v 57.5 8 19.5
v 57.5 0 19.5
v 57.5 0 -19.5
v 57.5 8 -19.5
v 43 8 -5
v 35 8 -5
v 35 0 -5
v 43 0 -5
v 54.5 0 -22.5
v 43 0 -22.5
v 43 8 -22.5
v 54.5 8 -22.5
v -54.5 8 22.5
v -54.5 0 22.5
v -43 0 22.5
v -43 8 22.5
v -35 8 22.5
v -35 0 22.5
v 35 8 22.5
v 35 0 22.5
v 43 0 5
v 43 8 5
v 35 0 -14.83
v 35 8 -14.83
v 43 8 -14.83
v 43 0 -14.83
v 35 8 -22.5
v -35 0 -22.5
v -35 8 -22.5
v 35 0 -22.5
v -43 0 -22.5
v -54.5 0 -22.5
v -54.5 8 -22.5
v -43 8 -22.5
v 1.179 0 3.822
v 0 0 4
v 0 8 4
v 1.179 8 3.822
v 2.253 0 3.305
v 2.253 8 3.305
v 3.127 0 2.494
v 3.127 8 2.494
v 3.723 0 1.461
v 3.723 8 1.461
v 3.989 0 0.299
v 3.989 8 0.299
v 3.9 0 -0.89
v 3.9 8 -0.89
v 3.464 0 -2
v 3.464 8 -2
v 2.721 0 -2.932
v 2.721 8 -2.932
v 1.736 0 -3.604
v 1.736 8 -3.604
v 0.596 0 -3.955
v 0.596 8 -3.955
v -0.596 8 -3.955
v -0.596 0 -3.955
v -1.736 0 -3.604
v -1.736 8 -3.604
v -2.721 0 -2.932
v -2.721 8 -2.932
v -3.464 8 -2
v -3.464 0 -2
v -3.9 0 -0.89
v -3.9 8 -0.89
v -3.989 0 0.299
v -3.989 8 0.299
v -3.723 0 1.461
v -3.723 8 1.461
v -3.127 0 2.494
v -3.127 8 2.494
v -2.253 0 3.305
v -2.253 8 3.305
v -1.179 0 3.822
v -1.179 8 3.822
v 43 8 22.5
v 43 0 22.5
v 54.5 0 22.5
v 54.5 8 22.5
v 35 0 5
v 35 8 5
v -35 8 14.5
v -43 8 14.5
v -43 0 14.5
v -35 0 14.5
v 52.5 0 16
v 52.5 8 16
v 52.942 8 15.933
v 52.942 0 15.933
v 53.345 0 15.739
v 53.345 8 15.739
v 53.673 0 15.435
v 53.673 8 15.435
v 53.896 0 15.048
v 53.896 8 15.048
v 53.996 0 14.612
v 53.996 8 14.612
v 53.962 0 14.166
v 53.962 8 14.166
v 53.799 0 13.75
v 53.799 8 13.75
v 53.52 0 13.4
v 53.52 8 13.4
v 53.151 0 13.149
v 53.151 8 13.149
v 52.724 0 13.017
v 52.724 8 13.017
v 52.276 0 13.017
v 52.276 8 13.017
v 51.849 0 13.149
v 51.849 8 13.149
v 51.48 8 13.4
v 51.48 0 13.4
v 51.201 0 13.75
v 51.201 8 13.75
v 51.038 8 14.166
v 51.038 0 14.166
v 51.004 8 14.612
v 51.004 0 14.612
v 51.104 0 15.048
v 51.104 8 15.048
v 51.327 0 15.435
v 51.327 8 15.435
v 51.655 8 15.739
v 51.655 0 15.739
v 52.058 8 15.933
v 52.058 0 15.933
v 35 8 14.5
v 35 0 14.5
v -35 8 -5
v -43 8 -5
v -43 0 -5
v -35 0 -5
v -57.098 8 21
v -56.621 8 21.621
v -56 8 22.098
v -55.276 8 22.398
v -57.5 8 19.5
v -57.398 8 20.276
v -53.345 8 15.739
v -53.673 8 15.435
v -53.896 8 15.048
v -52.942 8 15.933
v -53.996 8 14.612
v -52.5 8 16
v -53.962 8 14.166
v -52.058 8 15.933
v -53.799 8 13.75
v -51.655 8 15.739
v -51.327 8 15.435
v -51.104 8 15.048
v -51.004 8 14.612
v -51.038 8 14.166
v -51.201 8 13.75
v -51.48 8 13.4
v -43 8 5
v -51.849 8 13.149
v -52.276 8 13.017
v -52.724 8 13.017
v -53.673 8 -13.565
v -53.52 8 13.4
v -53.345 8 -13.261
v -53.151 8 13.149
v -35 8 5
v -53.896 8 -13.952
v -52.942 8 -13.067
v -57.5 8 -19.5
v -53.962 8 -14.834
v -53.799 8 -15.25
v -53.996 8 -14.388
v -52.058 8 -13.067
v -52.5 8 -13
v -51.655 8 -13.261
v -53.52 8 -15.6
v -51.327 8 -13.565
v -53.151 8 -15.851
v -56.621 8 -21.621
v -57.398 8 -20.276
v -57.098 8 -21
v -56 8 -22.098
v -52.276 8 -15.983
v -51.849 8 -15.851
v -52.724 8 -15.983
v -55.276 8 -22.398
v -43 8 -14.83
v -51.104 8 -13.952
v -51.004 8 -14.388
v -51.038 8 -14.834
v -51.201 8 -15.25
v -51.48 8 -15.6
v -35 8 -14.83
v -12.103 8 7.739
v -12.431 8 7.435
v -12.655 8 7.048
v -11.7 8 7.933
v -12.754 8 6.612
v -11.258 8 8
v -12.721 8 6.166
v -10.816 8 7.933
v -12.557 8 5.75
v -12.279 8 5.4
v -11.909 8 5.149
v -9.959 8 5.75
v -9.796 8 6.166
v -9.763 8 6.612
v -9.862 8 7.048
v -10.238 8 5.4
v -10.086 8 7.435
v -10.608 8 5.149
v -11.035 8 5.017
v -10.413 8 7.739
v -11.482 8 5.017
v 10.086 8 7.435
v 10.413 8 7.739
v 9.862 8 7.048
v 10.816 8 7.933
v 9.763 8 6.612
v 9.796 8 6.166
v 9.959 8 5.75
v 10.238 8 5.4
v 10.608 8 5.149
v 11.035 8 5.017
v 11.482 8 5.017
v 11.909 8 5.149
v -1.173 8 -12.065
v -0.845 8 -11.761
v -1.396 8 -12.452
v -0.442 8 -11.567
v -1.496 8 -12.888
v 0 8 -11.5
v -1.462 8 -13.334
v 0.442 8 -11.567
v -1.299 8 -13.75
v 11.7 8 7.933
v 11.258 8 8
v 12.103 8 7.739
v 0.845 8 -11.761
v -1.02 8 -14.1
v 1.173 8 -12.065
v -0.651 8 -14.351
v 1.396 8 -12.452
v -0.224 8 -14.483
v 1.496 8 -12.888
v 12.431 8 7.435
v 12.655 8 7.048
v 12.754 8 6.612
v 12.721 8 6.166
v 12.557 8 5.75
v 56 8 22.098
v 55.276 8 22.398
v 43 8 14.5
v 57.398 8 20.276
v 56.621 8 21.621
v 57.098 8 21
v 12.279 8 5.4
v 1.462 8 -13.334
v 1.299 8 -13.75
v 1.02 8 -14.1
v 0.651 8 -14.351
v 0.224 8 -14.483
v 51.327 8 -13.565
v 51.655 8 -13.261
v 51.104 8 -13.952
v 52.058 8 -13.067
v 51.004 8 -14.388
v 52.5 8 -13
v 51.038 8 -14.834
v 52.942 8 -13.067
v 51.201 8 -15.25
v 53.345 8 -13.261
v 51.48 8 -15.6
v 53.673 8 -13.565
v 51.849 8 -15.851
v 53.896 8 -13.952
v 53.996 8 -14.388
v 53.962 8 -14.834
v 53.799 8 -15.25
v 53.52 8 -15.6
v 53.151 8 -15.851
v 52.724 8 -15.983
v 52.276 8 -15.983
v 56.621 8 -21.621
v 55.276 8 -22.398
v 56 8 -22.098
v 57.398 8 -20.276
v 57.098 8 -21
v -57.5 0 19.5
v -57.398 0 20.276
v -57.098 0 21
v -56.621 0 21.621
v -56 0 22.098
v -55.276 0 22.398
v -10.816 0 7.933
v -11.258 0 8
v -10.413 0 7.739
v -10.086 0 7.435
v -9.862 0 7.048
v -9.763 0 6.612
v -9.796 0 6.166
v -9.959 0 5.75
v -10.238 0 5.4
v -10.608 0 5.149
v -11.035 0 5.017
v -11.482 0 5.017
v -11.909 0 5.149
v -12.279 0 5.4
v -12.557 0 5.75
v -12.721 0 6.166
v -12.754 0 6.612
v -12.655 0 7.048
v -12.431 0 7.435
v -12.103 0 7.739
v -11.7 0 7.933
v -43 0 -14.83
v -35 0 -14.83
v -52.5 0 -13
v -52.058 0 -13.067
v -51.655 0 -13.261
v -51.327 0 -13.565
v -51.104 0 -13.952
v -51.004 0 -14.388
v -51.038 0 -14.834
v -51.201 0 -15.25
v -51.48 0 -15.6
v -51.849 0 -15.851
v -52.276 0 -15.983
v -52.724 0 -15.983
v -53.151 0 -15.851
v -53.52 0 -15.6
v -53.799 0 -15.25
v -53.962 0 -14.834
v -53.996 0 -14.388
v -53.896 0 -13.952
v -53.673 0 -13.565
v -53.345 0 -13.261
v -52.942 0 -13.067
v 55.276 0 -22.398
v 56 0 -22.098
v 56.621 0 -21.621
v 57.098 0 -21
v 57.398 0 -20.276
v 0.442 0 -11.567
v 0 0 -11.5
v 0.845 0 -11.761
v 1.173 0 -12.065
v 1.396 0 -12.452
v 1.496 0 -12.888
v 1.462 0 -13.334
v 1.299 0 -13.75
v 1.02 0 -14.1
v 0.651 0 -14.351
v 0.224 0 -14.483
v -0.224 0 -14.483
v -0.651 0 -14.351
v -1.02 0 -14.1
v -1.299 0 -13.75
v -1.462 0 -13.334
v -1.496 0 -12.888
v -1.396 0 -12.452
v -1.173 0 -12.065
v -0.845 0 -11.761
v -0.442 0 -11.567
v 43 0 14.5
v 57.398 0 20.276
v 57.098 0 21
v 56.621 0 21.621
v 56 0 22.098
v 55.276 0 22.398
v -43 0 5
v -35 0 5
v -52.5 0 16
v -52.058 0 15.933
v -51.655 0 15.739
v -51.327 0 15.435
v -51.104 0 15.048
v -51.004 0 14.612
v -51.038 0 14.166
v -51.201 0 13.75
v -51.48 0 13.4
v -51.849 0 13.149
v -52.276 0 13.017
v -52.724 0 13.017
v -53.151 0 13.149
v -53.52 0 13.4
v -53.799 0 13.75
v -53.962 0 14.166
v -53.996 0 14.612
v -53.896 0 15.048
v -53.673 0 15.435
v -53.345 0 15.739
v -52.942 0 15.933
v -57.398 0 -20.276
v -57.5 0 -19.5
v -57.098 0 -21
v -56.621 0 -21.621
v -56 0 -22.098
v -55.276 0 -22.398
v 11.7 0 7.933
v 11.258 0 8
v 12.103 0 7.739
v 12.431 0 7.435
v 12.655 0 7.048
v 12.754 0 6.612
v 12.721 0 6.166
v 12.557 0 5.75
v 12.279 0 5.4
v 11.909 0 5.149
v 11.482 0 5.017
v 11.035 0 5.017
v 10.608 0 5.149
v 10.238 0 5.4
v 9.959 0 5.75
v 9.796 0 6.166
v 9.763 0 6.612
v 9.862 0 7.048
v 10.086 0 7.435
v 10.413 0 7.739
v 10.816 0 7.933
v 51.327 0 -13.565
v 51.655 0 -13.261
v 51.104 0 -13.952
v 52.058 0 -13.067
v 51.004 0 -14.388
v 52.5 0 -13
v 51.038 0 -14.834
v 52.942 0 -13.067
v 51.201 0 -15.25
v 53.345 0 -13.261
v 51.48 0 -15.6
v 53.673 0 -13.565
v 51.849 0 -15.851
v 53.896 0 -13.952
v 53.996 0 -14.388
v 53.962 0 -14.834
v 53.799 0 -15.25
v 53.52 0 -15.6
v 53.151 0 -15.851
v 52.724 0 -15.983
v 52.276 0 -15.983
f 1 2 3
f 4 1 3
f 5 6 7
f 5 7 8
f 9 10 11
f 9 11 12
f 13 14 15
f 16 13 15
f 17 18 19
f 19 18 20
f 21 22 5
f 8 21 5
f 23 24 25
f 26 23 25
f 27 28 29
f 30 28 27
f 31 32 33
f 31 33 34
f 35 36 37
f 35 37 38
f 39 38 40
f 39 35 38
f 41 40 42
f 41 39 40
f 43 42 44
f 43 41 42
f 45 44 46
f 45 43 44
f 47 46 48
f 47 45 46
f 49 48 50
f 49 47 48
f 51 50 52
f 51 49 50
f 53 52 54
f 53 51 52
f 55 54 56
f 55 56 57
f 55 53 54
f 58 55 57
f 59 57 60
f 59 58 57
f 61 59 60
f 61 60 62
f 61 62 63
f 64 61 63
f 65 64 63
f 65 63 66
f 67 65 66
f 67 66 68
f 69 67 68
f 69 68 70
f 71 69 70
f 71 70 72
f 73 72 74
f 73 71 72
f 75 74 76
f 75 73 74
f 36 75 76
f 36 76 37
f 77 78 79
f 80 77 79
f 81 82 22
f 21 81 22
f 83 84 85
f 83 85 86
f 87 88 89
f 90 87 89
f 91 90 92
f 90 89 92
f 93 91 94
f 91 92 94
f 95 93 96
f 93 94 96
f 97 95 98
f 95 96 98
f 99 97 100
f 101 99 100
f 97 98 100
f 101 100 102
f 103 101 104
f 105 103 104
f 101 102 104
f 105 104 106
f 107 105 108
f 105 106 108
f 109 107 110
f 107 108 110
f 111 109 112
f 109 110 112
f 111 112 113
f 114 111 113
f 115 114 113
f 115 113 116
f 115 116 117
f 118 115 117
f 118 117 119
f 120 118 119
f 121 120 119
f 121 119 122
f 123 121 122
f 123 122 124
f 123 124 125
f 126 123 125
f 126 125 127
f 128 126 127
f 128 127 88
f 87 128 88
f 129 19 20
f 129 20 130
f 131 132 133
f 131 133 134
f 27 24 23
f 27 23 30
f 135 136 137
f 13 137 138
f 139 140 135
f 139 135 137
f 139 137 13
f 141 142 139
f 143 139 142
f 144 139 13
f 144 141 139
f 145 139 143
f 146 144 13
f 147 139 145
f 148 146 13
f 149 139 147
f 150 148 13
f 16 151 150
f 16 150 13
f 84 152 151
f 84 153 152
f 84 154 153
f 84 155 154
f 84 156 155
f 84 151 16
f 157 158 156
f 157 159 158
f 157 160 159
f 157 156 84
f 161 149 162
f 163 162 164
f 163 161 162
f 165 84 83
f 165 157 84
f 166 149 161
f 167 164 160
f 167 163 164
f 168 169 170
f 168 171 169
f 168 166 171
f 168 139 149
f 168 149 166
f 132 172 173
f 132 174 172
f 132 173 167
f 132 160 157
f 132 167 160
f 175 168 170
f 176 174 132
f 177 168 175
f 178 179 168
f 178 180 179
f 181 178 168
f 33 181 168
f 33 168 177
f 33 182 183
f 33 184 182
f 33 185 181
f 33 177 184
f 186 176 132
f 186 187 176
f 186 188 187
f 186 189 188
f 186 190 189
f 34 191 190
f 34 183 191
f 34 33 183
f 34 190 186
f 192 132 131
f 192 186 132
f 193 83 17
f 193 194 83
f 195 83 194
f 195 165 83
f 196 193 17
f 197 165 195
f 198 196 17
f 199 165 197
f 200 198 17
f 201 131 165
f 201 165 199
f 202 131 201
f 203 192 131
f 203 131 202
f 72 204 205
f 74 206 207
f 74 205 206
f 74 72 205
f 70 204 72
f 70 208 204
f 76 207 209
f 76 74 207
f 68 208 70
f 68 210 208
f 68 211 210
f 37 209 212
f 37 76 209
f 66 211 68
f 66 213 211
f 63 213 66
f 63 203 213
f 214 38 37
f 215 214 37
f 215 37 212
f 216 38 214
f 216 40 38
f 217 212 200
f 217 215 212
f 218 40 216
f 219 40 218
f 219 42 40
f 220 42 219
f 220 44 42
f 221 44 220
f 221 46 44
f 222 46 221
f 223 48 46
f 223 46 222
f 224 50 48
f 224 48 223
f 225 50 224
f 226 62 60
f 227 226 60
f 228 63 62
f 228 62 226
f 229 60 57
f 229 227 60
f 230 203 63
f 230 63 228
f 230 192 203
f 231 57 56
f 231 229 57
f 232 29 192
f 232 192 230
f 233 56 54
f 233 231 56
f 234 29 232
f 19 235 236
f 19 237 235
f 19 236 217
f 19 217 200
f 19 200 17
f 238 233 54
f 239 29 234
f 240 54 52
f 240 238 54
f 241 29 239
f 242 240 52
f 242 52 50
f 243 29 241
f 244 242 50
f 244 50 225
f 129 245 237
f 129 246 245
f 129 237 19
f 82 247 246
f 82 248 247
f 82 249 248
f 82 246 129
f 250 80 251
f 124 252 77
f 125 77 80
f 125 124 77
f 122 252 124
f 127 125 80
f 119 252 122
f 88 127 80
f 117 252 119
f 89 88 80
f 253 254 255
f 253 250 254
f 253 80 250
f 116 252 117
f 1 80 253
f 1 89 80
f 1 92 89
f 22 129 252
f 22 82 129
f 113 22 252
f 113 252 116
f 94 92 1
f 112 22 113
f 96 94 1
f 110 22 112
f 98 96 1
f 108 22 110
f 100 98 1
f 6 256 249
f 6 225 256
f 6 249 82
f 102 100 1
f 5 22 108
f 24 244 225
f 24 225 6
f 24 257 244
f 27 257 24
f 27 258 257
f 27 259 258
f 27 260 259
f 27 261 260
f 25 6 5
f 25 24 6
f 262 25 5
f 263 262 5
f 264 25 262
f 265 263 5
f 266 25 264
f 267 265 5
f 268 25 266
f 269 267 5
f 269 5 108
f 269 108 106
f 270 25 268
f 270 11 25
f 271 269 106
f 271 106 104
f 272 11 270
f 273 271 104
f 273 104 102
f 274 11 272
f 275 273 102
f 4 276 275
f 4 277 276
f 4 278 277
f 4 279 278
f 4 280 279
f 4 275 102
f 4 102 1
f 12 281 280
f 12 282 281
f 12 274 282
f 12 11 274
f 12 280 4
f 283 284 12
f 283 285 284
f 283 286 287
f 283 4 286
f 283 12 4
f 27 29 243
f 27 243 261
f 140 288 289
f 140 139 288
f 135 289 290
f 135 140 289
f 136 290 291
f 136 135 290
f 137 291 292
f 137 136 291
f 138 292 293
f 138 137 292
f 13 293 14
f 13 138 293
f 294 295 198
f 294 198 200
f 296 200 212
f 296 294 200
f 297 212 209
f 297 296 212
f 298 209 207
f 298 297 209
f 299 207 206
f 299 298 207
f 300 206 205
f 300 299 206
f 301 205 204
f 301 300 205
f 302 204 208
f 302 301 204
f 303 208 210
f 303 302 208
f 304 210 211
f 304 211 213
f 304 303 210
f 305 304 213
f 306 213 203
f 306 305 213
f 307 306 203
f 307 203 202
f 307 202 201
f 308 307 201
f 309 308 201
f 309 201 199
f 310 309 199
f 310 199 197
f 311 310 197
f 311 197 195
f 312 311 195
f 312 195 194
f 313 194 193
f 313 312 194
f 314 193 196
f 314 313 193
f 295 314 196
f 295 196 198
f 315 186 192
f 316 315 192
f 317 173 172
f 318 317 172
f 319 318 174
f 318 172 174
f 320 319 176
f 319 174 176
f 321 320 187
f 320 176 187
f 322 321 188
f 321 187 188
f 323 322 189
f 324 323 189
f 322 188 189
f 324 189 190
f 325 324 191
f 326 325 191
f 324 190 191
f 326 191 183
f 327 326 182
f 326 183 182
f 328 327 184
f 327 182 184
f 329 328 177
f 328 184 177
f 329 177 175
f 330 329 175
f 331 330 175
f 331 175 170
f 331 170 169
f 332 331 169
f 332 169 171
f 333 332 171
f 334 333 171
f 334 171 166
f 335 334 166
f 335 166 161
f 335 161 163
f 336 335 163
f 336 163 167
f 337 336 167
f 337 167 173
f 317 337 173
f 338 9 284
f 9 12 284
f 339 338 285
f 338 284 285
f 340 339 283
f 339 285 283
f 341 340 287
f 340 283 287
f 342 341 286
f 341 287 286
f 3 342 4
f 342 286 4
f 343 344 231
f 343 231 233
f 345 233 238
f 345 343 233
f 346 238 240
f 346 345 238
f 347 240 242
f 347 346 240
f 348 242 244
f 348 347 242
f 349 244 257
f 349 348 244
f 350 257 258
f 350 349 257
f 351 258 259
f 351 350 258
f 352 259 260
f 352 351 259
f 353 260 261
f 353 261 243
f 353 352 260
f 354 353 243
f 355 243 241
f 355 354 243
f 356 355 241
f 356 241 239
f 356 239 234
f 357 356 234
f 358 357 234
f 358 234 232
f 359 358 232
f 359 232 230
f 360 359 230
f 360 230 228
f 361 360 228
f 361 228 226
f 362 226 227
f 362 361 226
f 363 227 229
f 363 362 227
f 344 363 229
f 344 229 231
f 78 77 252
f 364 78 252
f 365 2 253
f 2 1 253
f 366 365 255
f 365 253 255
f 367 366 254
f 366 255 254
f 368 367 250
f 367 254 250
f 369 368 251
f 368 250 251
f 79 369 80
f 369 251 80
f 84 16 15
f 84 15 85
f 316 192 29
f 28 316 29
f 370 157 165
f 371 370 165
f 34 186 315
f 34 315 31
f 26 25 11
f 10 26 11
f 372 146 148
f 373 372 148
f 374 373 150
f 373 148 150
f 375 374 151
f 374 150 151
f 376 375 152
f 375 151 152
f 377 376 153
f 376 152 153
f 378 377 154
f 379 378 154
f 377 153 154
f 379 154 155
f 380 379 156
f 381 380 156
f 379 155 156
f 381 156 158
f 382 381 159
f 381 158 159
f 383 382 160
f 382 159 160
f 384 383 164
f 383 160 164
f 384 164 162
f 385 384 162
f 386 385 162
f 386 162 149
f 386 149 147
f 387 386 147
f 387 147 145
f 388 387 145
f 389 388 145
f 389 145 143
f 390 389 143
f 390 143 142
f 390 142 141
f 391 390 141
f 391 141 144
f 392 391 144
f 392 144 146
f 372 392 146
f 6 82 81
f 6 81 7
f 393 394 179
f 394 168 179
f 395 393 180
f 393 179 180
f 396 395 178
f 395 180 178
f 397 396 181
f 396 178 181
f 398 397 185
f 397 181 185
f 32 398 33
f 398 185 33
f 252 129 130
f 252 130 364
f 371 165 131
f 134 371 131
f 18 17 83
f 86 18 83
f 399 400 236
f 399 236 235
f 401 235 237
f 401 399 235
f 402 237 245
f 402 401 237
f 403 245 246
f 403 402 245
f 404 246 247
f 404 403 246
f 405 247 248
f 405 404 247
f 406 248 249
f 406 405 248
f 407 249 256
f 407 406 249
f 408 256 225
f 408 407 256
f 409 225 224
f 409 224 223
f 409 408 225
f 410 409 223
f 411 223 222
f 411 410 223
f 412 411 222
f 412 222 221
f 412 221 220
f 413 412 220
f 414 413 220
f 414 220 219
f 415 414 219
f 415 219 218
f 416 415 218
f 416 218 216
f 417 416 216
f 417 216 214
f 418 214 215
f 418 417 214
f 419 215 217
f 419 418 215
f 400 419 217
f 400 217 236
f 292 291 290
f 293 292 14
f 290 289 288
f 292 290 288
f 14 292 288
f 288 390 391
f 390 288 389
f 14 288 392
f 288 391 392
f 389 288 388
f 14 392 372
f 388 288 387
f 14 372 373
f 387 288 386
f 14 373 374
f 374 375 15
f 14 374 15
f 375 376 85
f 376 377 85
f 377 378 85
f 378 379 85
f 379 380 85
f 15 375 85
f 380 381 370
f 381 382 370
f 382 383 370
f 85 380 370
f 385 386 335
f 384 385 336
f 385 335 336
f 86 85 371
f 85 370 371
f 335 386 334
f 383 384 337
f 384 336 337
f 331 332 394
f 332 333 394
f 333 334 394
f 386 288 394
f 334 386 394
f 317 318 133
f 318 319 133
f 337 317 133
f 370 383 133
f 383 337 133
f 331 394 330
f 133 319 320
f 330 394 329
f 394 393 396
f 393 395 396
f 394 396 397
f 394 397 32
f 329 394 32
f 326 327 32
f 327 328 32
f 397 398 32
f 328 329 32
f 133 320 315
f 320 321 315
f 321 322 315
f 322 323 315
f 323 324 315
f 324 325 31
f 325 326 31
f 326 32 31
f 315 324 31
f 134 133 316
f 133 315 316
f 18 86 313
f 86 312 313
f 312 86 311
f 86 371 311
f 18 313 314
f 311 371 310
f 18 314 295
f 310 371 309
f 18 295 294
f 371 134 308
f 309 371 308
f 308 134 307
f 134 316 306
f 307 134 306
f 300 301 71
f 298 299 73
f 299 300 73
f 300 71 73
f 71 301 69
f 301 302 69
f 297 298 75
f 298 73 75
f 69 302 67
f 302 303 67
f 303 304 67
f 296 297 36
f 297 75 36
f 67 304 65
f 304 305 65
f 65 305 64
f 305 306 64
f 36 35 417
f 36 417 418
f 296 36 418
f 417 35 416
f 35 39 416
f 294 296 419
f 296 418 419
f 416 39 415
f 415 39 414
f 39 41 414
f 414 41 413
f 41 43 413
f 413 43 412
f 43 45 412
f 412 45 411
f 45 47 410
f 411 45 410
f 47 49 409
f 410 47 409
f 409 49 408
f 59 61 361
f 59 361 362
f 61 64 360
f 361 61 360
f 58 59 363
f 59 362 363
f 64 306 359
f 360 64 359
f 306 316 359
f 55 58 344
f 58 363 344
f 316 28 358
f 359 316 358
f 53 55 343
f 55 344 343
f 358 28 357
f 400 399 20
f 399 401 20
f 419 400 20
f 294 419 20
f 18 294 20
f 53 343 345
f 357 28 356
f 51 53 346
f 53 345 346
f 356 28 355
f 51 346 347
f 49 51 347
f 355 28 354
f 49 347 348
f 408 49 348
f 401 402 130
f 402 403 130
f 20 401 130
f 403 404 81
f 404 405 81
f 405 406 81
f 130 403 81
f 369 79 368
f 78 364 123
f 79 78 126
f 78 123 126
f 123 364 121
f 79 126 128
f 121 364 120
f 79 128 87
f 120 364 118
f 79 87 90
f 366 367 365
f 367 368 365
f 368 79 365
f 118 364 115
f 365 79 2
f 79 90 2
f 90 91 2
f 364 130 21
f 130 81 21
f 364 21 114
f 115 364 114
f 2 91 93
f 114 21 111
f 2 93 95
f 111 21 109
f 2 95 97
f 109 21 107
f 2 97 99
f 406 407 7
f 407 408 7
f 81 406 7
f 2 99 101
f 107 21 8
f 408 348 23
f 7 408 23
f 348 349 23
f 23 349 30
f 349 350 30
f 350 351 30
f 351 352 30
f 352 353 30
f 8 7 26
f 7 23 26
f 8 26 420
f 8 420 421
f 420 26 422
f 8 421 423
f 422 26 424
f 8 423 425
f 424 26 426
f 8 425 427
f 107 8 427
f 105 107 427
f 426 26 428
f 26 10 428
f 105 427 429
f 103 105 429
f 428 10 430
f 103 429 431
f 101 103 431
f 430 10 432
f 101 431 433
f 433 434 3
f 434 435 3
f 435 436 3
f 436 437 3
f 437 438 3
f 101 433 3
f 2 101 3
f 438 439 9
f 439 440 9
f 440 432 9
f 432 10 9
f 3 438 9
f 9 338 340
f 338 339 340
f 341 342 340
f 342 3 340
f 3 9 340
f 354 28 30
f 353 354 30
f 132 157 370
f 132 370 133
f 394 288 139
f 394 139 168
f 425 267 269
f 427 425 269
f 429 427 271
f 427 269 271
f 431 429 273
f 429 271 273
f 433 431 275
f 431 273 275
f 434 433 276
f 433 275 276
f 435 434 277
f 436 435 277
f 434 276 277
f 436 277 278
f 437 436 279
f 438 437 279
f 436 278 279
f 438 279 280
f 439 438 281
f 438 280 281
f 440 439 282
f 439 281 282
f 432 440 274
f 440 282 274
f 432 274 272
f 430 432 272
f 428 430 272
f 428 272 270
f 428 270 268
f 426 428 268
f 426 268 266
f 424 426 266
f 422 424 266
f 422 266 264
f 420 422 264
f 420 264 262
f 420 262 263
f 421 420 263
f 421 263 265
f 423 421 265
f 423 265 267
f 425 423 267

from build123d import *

# Parameters (mm, degrees)
SKETCH1_W           = 115
SKETCH1_H           = 45
SKETCH1_R           = 4
SKETCH1_R_2         = 1.5
BOSS_EXTRUDE1_DEPTH = 8
SKETCH2_W           = 8
SKETCH2_H           = 10
SKETCH2_H_2         = 8
CUT_EXTRUDE1_DEPTH  = 16
FILLET1_R           = 3
SKETCH4_R           = 1.5
CUT_EXTRUDE2_DEPTH  = 16


with BuildPart() as part:
    # Sketch1 → Boss-Extrude1 (new body)
    with BuildSketch(Plane(origin=(0, 0, 0), x_dir=(1, 0, 0), z_dir=(0, 1, 0))):
        Rectangle(SKETCH1_W, SKETCH1_H)
        with Locations(Location((0, 0, 0), (0, 0, 270))):
            Circle(SKETCH1_R, mode=Mode.SUBTRACT)
        with Locations(Location((0, 13, 0), (0, 0, 270))):
            Circle(SKETCH1_R_2, mode=Mode.SUBTRACT)
        with Locations(Location((11.258330249, -6.5, 0), (0, 0, 270))):
            Circle(SKETCH1_R_2, mode=Mode.SUBTRACT)
        with Locations(Location((-11.258330249, -6.5, 0), (0, 0, 270))):
            Circle(SKETCH1_R_2, mode=Mode.SUBTRACT)
    extrude(amount=BOSS_EXTRUDE1_DEPTH)

    # Sketch2 → Cut-Extrude1 (cut)
    with BuildSketch(Plane(origin=(0, 8, 0), x_dir=(1, 0, 0), z_dir=(0, 1, 0))):
        with Locations((-39, 0)):
            Rectangle(SKETCH2_W, SKETCH2_H)
        with Locations((-39, 18.82979477)):
            Rectangle(SKETCH2_W, SKETCH2_H_2)
        with Locations((39, 18.82979477)):
            Rectangle(SKETCH2_W, SKETCH2_H_2)
        with Locations((39, 0)):
            Rectangle(SKETCH2_W, SKETCH2_H)
        with Locations((-39, -18.5)):
            Rectangle(SKETCH2_W, SKETCH2_H_2)
        with Locations((39, -18.5)):
            Rectangle(SKETCH2_W, SKETCH2_H_2)
    extrude(amount=-CUT_EXTRUDE1_DEPTH, mode=Mode.SUBTRACT)

    # Fillet1
    fillet1_edges = [part.edges().sort_by_distance(p)[0] for p in [
        (-57.5, 4, 22.5),
        (-57.5, 4, -22.5),
        (57.5, 4, -22.5),
        (57.5, 4, 22.5),
    ]]
    fillet(fillet1_edges, radius=FILLET1_R)

    # Sketch4 → Cut-Extrude2 (cut)
    with BuildSketch(Plane(origin=(0, 8, 0), x_dir=(1, 0, 0), z_dir=(0, 1, 0))):
        with Locations(Location((52.5, 14.5, 0), (0, 0, 270))):
            Circle(SKETCH4_R)
        with Locations(Location((-52.5, 14.5, 0), (0, 0, 270))):
            Circle(SKETCH4_R)
        with Locations(Location((-52.5, -14.5, 0), (0, 0, 270))):
            Circle(SKETCH4_R)
        with Locations(Location((52.5, -14.5, 0), (0, 0, 270))):
            Circle(SKETCH4_R)
    extrude(amount=-CUT_EXTRUDE2_DEPTH, mode=Mode.SUBTRACT)


solid = part.part
